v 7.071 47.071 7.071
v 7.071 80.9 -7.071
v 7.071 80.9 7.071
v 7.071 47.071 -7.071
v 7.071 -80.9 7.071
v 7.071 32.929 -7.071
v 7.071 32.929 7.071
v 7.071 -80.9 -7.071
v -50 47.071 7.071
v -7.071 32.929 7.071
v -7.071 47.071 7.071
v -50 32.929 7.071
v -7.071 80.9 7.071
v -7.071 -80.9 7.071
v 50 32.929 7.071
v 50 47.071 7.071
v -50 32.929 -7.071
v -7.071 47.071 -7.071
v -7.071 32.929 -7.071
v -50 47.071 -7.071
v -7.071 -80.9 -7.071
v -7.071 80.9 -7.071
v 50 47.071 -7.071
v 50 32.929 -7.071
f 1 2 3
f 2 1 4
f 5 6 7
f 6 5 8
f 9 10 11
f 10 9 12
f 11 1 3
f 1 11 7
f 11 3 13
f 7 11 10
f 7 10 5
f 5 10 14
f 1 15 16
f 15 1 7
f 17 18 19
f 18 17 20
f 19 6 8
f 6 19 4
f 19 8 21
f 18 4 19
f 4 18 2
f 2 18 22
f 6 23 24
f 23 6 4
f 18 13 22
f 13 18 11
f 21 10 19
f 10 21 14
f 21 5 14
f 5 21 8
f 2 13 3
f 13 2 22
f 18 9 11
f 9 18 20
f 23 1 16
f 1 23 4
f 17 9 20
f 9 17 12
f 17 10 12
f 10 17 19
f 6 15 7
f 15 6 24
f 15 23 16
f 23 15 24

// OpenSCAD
// cruz

$fa = 1;
$fs = 0.5;

/// cruz

_h = 100;
phi = 1.618;

//union(){
//    //color("green") 
//    rotate(a=[90,0,0])
//    cylinder(_h*phi,10,10,center=true);
//
//    translate([0, .8*_h/2, 0]) 
//    rotate(a=[90,0,90])
//    //color("red") 
//    cylinder(_h,10,10,center=true);
//}

//union(){
//    //color("green") 
//    rotate(a=[90,0,0])
//    cylinder(_h*phi,10,10,center=true,$fn=4);
//
//    translate([0, .8*_h/2, 0]) 
//    rotate(a=[90,0,90])
//    //color("red") 
//    cylinder(_h,10,10,center=true,$fn=4);
//}

union(){
    rotate(a=[90,45,0])
    cylinder(_h*phi,10,10,center=true,$fn=4);

    translate([0, .8*_h/2, 0]) 
    rotate(a=[90,45,90])
    cylinder(_h,10,10,center=true,$fn=4);
}

///
